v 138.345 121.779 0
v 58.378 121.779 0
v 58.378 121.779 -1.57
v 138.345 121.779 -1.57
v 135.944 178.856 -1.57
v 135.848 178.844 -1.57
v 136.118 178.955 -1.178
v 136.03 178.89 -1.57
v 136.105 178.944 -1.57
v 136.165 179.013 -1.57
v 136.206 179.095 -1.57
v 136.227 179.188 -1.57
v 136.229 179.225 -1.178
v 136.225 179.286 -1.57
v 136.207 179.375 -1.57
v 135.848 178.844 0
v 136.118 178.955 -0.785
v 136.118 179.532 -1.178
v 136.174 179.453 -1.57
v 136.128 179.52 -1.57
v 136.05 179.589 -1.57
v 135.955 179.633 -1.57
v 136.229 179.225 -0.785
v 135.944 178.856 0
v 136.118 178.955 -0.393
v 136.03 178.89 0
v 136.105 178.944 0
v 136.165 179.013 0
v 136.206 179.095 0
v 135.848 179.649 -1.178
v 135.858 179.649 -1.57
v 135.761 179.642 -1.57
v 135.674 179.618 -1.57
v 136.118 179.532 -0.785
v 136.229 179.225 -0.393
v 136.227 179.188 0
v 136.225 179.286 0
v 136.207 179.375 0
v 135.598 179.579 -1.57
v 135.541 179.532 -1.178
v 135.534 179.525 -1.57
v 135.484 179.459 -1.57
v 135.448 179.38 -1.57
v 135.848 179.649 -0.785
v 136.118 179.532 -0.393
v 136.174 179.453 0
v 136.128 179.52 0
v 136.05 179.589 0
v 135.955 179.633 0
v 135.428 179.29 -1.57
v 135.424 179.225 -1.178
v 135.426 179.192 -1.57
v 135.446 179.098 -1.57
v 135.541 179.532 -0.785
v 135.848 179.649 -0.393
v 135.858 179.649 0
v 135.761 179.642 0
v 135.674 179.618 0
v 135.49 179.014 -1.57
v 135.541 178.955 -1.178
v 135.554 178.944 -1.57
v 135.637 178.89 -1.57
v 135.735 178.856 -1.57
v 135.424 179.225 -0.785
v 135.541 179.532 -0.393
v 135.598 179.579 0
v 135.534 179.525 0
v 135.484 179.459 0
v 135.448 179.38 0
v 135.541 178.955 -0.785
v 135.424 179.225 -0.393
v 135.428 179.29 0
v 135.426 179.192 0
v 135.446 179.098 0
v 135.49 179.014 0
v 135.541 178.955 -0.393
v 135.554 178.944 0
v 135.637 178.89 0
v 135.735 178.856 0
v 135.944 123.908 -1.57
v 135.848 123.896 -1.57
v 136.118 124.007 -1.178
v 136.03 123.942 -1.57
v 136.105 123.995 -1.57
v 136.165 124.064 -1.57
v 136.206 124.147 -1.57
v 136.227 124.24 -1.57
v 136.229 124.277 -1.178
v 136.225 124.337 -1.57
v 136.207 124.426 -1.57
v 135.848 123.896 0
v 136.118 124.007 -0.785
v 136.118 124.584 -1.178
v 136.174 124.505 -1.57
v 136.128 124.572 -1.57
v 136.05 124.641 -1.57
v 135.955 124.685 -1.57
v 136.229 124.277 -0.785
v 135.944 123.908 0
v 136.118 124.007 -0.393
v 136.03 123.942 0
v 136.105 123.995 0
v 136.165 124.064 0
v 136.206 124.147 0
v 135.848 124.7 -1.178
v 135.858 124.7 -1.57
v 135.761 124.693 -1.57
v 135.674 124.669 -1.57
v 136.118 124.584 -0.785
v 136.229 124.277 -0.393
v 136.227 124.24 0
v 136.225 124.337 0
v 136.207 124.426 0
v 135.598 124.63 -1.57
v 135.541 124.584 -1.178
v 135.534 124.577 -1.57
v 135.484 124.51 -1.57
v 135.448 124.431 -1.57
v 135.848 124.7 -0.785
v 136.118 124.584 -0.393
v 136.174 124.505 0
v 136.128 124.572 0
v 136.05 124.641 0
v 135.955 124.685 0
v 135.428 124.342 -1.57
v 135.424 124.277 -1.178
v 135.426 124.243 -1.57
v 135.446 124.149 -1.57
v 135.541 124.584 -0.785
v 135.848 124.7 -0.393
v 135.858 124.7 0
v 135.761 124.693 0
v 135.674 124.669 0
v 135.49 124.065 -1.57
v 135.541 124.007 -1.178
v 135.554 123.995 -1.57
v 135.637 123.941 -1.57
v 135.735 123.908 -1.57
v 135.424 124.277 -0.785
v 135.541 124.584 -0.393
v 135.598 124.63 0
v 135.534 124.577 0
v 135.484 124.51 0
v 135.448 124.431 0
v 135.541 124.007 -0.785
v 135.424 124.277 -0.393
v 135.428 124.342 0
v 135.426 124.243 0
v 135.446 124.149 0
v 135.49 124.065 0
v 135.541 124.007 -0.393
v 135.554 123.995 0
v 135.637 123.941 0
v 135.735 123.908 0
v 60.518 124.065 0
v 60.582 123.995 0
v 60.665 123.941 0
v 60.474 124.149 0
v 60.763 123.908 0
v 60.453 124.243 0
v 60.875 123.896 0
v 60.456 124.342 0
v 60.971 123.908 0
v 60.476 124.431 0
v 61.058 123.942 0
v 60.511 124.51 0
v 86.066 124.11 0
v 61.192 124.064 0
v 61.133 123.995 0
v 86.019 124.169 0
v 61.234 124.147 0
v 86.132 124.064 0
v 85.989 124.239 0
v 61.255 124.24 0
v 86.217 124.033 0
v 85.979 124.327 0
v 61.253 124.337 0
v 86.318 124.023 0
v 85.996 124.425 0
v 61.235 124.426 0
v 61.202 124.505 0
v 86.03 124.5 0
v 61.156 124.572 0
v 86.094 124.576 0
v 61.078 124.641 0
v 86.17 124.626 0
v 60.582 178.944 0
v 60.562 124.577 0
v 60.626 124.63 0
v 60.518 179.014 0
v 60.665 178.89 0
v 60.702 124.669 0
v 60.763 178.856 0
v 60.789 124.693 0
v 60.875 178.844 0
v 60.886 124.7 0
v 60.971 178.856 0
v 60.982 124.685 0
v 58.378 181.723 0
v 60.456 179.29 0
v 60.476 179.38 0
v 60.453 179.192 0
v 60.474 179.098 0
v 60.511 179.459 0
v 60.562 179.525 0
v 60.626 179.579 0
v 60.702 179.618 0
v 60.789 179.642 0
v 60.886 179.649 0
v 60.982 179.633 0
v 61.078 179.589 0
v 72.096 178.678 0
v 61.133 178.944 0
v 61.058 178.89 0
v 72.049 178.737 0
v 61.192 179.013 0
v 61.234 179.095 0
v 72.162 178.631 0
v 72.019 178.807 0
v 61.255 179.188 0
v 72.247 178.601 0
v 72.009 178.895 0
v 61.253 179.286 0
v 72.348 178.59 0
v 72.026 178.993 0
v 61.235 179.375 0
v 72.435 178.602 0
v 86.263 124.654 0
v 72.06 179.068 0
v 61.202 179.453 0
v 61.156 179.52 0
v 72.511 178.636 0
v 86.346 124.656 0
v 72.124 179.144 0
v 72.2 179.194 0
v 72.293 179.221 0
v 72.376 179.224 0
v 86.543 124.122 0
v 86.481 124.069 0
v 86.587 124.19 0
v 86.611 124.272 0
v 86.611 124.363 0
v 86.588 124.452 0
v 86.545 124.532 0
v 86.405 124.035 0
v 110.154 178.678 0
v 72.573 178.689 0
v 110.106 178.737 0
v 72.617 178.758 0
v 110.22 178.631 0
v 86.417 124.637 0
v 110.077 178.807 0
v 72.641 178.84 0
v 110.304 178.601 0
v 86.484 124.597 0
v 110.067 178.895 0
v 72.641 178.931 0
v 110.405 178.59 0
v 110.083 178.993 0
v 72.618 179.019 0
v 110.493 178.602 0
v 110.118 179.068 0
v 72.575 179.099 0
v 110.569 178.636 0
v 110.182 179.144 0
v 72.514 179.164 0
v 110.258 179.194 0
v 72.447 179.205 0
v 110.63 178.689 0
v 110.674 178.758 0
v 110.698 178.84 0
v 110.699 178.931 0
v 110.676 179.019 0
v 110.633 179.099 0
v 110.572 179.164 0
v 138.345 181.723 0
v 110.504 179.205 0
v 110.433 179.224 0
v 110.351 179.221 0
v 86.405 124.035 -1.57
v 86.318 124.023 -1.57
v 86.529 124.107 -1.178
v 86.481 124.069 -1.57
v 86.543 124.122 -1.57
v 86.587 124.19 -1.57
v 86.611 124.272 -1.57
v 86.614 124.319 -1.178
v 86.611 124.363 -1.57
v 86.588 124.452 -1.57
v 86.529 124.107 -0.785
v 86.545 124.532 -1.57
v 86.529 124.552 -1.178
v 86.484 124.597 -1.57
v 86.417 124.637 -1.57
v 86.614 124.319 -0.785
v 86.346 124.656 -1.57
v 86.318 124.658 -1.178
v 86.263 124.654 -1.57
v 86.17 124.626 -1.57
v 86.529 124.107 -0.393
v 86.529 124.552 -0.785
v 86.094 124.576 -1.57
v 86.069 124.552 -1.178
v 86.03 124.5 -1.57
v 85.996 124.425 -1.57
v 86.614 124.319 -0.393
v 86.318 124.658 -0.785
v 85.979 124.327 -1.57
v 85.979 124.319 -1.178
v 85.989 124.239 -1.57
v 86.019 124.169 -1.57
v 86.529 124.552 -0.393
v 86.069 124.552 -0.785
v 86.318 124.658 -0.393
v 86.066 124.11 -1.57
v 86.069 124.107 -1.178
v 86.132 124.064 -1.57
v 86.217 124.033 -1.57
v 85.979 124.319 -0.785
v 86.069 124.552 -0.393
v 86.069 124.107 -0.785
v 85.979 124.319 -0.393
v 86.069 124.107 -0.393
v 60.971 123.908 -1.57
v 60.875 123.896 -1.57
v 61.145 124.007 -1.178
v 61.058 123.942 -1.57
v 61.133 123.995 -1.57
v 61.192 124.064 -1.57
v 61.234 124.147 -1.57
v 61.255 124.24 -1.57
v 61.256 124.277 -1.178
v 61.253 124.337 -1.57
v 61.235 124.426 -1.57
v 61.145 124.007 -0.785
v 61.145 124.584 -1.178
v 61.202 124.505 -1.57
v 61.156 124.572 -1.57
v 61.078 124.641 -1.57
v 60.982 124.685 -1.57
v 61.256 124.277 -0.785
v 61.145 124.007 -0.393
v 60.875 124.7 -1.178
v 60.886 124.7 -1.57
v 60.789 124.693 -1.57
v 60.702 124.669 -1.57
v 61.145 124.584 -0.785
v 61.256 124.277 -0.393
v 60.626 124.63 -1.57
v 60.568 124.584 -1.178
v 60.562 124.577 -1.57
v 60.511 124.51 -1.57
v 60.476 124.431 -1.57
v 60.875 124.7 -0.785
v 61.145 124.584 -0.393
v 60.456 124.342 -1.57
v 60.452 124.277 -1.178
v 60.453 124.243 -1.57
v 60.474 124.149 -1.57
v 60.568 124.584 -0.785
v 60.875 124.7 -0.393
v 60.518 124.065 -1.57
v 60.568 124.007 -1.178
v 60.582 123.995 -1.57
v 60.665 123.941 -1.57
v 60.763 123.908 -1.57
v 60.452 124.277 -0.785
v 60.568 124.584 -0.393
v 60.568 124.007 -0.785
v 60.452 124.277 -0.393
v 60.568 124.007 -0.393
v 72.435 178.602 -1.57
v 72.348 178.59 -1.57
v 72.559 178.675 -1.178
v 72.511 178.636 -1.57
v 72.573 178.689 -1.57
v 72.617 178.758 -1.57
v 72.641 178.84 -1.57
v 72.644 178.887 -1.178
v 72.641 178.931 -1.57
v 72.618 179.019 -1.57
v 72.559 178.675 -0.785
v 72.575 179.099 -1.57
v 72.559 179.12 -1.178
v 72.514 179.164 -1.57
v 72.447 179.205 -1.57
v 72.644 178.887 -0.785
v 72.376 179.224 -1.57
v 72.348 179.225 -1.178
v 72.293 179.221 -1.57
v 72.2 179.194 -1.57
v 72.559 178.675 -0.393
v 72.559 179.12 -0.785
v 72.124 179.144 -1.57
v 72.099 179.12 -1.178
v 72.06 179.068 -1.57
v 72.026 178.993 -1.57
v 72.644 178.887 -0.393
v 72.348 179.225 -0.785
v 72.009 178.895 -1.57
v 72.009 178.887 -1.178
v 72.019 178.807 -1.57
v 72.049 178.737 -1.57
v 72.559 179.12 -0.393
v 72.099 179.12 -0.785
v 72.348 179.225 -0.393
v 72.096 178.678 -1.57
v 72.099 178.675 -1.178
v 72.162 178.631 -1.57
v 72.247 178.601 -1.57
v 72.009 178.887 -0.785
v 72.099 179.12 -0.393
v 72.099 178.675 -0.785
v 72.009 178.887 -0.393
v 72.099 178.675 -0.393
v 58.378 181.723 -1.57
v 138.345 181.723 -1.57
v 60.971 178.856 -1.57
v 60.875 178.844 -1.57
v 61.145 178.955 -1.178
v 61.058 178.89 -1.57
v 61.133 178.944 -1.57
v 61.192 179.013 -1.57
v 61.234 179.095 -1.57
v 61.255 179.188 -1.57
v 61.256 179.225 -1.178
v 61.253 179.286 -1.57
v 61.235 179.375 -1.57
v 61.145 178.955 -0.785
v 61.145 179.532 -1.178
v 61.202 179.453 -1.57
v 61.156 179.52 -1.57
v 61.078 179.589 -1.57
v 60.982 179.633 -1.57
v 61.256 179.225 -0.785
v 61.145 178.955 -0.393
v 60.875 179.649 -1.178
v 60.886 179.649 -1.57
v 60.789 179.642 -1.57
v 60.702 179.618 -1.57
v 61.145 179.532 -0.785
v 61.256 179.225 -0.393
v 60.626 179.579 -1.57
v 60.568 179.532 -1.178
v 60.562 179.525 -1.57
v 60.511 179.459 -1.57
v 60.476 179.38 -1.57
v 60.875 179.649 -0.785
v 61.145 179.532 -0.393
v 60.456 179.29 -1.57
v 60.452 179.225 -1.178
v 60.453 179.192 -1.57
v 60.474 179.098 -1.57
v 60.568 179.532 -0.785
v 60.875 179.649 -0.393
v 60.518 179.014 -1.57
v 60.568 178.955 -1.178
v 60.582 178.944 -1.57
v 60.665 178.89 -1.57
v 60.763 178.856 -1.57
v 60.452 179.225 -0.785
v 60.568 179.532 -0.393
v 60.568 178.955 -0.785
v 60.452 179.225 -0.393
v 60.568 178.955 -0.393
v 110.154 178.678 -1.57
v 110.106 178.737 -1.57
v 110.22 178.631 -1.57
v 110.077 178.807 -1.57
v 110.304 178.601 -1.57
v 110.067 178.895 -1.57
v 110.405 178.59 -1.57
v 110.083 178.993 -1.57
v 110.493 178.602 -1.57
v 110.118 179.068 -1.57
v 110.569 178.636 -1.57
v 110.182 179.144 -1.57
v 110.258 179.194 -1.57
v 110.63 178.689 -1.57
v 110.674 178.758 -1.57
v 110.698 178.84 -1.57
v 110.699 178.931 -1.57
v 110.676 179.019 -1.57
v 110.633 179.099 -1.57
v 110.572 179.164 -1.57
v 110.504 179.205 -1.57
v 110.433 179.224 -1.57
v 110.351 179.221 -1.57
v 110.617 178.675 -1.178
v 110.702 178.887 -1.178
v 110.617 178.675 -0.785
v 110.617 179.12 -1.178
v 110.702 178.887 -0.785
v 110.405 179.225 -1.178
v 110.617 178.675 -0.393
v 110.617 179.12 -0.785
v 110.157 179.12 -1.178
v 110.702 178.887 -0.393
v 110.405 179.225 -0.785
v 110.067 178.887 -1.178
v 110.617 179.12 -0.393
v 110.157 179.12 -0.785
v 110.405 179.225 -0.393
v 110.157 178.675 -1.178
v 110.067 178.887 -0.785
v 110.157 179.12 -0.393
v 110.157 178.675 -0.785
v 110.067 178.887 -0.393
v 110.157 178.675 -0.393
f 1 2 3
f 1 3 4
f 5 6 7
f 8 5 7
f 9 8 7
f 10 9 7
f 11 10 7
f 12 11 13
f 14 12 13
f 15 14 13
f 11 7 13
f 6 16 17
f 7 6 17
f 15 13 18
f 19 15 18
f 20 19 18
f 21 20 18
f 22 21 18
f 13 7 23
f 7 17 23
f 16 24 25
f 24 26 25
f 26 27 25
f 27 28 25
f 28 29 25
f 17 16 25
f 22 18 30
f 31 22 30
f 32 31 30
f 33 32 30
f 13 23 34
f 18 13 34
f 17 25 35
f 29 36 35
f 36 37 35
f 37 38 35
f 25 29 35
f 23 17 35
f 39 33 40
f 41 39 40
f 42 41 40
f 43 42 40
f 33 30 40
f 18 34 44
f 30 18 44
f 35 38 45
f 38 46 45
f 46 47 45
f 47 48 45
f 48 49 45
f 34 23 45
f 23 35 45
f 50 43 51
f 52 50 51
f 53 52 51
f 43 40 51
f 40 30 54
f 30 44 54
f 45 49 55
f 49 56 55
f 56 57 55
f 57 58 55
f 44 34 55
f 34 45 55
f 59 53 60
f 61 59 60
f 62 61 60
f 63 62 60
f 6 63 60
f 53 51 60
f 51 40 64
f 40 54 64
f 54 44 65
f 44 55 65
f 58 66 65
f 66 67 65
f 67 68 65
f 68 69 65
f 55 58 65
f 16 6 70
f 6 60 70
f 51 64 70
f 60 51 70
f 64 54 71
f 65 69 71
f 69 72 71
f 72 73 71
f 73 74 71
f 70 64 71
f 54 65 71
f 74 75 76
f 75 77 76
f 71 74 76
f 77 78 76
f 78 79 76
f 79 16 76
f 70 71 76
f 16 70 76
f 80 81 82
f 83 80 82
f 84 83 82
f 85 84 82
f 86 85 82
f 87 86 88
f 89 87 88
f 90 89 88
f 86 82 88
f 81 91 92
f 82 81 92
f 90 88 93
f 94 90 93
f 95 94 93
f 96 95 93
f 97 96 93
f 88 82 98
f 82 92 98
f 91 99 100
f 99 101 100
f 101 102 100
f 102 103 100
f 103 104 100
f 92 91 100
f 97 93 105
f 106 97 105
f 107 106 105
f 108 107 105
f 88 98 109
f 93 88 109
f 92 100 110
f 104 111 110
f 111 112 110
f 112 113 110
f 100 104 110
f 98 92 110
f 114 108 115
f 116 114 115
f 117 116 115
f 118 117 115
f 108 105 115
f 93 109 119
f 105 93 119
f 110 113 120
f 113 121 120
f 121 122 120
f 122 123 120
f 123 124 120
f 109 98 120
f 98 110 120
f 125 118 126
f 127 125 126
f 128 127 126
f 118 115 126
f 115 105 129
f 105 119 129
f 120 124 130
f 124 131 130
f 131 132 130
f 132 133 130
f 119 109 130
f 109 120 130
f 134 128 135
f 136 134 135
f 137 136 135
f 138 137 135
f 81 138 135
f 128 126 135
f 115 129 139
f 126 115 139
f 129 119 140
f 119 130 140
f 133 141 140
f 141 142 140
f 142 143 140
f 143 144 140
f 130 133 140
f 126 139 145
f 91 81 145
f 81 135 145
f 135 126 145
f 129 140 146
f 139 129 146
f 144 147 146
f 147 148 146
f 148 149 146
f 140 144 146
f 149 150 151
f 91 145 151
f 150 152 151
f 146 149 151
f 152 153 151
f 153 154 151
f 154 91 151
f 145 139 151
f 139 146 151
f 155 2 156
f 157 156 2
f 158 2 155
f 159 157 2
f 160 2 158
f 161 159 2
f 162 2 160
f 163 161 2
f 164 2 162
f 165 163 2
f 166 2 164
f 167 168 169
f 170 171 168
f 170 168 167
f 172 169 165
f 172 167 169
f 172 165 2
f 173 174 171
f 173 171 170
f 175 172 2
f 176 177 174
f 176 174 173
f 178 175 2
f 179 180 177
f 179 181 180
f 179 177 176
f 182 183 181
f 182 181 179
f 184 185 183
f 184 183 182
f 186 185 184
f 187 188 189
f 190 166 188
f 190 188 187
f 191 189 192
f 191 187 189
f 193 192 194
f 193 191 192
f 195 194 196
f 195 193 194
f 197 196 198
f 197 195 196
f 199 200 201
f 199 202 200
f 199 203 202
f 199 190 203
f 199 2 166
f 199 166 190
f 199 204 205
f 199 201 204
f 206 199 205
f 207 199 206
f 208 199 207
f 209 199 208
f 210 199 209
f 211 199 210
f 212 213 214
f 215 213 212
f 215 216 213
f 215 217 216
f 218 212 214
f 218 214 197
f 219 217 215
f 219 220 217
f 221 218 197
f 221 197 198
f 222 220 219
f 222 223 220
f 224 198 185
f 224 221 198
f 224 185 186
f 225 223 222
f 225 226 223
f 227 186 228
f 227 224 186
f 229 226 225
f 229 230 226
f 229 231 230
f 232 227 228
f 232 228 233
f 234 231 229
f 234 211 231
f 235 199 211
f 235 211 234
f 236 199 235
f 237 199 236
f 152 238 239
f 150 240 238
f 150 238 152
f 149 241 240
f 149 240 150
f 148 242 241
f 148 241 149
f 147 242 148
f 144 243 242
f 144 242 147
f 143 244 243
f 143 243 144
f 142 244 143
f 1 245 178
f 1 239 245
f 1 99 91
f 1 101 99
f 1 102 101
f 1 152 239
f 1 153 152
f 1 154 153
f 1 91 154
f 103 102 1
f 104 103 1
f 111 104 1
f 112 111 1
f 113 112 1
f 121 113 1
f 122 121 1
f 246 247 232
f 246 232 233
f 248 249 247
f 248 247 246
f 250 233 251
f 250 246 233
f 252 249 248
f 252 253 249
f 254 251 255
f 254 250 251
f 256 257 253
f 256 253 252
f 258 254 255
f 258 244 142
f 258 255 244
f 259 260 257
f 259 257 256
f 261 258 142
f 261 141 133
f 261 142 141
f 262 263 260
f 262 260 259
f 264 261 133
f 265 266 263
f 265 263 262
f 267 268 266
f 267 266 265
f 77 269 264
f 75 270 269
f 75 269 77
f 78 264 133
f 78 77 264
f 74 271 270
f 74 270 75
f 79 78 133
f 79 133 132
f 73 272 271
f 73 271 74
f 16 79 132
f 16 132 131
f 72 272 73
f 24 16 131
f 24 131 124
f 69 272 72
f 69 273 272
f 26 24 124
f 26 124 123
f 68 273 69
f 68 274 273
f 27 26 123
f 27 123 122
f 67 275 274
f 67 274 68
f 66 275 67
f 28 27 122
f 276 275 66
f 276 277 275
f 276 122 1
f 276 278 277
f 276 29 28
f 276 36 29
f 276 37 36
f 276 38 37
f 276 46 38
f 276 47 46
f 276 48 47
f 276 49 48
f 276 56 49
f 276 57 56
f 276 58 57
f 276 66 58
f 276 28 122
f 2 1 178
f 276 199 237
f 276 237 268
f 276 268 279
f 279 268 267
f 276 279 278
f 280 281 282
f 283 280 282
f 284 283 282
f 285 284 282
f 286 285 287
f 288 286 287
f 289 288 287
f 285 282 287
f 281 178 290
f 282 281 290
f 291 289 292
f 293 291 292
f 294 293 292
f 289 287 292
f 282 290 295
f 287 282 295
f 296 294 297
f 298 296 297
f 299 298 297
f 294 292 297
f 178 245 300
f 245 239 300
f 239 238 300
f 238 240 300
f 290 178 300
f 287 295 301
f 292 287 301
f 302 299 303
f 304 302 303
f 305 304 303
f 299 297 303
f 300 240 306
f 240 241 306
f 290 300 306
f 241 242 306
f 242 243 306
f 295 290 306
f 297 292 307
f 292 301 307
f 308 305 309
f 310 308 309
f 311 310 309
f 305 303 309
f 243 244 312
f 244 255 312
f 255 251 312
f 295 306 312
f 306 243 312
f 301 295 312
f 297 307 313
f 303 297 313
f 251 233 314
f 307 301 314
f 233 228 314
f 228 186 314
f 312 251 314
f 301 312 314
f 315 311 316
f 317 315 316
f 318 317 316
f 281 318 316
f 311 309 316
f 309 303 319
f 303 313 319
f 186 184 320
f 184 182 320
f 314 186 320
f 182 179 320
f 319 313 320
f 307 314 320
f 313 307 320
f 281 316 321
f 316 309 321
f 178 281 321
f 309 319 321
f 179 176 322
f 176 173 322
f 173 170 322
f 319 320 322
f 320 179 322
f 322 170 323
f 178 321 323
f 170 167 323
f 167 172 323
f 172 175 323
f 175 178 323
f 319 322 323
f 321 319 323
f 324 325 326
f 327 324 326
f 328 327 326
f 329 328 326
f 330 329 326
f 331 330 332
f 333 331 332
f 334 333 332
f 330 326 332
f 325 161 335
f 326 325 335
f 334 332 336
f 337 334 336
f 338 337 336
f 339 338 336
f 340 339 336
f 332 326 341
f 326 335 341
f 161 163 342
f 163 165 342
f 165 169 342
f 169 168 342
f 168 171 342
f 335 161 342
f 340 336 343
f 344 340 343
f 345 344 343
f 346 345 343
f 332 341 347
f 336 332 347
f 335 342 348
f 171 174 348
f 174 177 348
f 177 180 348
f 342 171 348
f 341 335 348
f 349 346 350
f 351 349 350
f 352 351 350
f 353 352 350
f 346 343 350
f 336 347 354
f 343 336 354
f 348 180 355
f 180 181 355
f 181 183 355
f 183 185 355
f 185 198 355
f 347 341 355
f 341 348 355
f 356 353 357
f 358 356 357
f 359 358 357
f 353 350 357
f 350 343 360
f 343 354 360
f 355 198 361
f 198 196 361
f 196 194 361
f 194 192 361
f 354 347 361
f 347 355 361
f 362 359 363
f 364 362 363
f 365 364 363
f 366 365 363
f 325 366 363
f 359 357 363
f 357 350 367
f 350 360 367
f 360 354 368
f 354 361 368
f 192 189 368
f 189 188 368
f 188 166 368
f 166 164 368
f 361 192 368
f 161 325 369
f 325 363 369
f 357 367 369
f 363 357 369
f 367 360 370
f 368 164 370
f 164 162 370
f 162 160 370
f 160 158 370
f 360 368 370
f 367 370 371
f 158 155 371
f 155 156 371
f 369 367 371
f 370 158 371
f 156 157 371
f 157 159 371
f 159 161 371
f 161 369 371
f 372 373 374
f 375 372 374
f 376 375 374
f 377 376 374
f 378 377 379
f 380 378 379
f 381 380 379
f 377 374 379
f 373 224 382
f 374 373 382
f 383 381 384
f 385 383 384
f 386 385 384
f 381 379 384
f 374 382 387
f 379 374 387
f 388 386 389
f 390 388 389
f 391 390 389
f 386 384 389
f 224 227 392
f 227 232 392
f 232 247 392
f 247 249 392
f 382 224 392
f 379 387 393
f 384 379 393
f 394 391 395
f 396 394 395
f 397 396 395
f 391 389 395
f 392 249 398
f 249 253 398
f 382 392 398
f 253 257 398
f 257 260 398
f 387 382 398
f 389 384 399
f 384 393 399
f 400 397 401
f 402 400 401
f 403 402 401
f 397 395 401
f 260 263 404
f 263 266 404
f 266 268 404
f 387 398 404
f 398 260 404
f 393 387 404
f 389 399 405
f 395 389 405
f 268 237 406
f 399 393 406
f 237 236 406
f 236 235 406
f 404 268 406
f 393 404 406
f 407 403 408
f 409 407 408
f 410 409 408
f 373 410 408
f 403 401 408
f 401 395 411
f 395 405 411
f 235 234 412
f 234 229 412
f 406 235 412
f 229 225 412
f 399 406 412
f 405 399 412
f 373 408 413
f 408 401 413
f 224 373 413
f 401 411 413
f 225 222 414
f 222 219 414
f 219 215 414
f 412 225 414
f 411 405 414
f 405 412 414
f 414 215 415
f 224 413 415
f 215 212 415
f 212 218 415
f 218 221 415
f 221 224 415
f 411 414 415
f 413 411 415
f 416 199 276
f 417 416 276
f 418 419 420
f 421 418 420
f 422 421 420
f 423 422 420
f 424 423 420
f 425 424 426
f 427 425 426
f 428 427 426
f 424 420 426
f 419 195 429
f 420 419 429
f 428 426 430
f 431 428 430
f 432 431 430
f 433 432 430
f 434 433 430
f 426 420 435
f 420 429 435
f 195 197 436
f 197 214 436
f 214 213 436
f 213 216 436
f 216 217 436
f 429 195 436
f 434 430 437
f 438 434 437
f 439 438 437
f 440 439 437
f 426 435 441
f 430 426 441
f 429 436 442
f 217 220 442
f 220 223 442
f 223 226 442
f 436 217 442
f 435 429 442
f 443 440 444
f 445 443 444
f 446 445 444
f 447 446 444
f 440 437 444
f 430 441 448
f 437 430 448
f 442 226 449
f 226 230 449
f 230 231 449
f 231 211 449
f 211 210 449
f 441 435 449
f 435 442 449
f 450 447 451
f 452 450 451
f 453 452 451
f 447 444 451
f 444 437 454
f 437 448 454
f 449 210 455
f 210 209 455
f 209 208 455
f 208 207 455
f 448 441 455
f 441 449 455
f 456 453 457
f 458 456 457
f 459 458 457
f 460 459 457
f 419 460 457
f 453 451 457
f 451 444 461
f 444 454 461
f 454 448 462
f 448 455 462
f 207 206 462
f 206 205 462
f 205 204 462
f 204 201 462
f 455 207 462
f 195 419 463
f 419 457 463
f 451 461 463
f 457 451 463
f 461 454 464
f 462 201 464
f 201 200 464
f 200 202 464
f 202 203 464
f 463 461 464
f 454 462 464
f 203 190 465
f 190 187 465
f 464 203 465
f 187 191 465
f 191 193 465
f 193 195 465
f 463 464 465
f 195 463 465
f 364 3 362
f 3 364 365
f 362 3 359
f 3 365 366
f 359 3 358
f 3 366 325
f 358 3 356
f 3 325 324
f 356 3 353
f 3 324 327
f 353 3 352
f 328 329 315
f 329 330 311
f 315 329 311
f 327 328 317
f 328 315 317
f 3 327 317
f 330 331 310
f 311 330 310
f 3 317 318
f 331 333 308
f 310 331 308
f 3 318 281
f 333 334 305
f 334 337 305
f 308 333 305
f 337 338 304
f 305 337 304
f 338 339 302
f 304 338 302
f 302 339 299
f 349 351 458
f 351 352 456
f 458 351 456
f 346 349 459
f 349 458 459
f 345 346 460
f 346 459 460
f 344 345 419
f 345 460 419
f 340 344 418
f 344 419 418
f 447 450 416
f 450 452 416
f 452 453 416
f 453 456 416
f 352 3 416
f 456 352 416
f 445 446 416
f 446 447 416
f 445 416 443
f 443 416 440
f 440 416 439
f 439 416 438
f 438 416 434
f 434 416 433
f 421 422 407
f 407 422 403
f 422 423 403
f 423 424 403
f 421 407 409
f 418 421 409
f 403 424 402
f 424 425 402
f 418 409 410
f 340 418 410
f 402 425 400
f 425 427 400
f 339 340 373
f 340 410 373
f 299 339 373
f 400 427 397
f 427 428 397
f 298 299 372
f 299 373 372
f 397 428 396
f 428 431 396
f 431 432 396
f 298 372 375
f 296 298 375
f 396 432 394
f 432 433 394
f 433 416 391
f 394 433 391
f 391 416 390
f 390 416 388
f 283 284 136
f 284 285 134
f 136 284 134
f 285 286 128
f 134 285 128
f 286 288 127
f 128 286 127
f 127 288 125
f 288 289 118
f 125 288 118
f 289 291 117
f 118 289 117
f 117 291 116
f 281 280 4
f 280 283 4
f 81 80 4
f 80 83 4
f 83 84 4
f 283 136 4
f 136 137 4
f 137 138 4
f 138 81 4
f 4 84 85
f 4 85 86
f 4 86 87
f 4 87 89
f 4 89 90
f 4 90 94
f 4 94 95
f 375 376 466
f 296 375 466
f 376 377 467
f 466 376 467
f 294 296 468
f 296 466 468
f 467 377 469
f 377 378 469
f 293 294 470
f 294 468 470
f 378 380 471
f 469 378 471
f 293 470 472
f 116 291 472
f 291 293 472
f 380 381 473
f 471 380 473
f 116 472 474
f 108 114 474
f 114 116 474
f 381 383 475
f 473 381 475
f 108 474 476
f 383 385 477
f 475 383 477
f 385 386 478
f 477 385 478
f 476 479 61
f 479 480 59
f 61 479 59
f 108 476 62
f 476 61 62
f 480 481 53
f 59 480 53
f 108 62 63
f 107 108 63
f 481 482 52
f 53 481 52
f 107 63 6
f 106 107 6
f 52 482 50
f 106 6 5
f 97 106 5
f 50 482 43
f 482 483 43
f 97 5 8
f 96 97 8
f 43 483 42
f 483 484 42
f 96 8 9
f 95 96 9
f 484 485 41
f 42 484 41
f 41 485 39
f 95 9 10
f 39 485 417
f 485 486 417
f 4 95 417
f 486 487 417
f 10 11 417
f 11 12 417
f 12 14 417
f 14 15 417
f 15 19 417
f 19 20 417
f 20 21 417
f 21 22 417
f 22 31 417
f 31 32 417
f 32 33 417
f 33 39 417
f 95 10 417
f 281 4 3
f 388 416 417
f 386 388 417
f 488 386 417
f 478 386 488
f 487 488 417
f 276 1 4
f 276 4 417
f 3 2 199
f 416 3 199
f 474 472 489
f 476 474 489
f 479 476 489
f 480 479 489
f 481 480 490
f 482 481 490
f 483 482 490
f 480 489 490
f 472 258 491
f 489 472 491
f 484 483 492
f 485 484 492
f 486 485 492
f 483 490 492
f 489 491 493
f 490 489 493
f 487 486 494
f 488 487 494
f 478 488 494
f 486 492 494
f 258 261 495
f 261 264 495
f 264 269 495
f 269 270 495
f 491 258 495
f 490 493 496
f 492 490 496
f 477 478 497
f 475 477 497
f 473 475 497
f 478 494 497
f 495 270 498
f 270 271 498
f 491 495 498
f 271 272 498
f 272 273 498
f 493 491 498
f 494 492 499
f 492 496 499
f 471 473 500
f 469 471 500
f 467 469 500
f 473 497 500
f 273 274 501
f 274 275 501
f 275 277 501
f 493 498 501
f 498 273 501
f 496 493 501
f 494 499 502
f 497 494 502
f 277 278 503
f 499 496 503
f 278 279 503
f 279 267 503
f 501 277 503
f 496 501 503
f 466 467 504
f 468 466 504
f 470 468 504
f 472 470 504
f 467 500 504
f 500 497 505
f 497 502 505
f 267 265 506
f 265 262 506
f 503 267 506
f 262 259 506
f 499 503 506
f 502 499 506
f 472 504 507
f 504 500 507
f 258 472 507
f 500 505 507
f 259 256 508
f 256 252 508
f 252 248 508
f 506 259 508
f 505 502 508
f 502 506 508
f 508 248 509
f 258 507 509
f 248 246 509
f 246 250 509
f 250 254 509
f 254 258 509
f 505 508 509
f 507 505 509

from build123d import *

# Parameters (mm, degrees)
MODEL_W             = 79.967666
MODEL_H             = 59.944
BOSS_EXTRUDE2_DEPTH = 1.57


with BuildPart() as part:
    # Model → Boss-Extrude2 (new body)
    with BuildSketch(Plane.XY):
        with Locations((98.3615, 151.75103)):
            Rectangle(MODEL_W, MODEL_H)
        with BuildLine():
            add(Edge.make_bspline(
                [(86.614, 124.31903), (86.614, 124.488363), (86.487, 124.657697), (86.317667, 124.657697)],
                knots=[0, 0, 0, 0, 1, 1, 1, 1], degree=3))
            add(Edge.make_bspline(
                [(86.317667, 124.657697), (86.106, 124.657697), (85.979, 124.488363), (85.979, 124.31903)],
                knots=[0, 0, 0, 0, 1, 1, 1, 1], degree=3))
            add(Edge.make_bspline(
                [(85.979, 124.31903), (85.979, 124.149697), (86.106, 124.022697), (86.317667, 124.022697)],
                knots=[0, 0, 0, 0, 1, 1, 1, 1], degree=3))
            add(Edge.make_bspline(
                [(86.317667, 124.022697), (86.487, 124.022697), (86.614, 124.149697), (86.614, 124.31903)],
                knots=[0, 0, 0, 0, 1, 1, 1, 1], degree=3))
        make_face(mode=Mode.SUBTRACT)
        with BuildLine():
            add(Edge.make_bspline(
                [(61.256333, 124.276697), (61.256333, 124.530697), (61.087, 124.70003), (60.875333, 124.70003)],
                knots=[0, 0, 0, 0, 1, 1, 1, 1], degree=3))
            add(Edge.make_bspline(
                [(60.875333, 124.70003), (60.621333, 124.70003), (60.452, 124.530697), (60.452, 124.276697)],
                knots=[0, 0, 0, 0, 1, 1, 1, 1], degree=3))
            add(Edge.make_bspline(
                [(60.452, 124.276697), (60.452, 124.06503), (60.621333, 123.895697), (60.875333, 123.895697)],
                knots=[0, 0, 0, 0, 1, 1, 1, 1], degree=3))
            add(Edge.make_bspline(
                [(60.875333, 123.895697), (61.087, 123.895697), (61.256333, 124.06503), (61.256333, 124.276697)],
                knots=[0, 0, 0, 0, 1, 1, 1, 1], degree=3))
        make_face(mode=Mode.SUBTRACT)
        with BuildLine():
            add(Edge.make_bspline(
                [(136.228667, 124.276697), (136.228667, 124.530697), (136.059333, 124.70003), (135.847667, 124.70003)],
                knots=[0, 0, 0, 0, 1, 1, 1, 1], degree=3))
            add(Edge.make_bspline(
                [(135.847667, 124.70003), (135.593667, 124.70003), (135.424333, 124.530697), (135.424333, 124.276697)],
                knots=[0, 0, 0, 0, 1, 1, 1, 1], degree=3))
            add(Edge.make_bspline(
                [(135.424333, 124.276697), (135.424333, 124.06503), (135.593667, 123.895697), (135.847667, 123.895697)],
                knots=[0, 0, 0, 0, 1, 1, 1, 1], degree=3))
            add(Edge.make_bspline(
                [(135.847667, 123.895697), (136.059333, 123.895697), (136.228667, 124.06503), (136.228667, 124.276697)],
                knots=[0, 0, 0, 0, 1, 1, 1, 1], degree=3))
        make_face(mode=Mode.SUBTRACT)
        with BuildLine():
            add(Edge.make_bspline(
                [(136.228667, 179.225363), (136.228667, 179.479363), (136.059333, 179.648697), (135.847667, 179.648697)],
                knots=[0, 0, 0, 0, 1, 1, 1, 1], degree=3))
            add(Edge.make_bspline(
                [(135.847667, 179.648697), (135.593667, 179.648697), (135.424333, 179.479363), (135.424333, 179.225363)],
                knots=[0, 0, 0, 0, 1, 1, 1, 1], degree=3))
            add(Edge.make_bspline(
                [(135.424333, 179.225363), (135.424333, 179.013697), (135.593667, 178.844363), (135.847667, 178.844363)],
                knots=[0, 0, 0, 0, 1, 1, 1, 1], degree=3))
            add(Edge.make_bspline(
                [(135.847667, 178.844363), (136.059333, 178.844363), (136.228667, 179.013697), (136.228667, 179.225363)],
                knots=[0, 0, 0, 0, 1, 1, 1, 1], degree=3))
        make_face(mode=Mode.SUBTRACT)
        with BuildLine():
            add(Edge.make_bspline(
                [(72.644, 178.886697), (72.644, 179.05603), (72.517, 179.225363), (72.347667, 179.225363)],
                knots=[0, 0, 0, 0, 1, 1, 1, 1], degree=3))
            add(Edge.make_bspline(
                [(72.347667, 179.225363), (72.136, 179.225363), (72.009, 179.05603), (72.009, 178.886697)],
                knots=[0, 0, 0, 0, 1, 1, 1, 1], degree=3))
            add(Edge.make_bspline(
                [(72.009, 178.886697), (72.009, 178.717363), (72.136, 178.590363), (72.347667, 178.590363)],
                knots=[0, 0, 0, 0, 1, 1, 1, 1], degree=3))
            add(Edge.make_bspline(
                [(72.347667, 178.590363), (72.517, 178.590363), (72.644, 178.717363), (72.644, 178.886697)],
                knots=[0, 0, 0, 0, 1, 1, 1, 1], degree=3))
        make_face(mode=Mode.SUBTRACT)
        with BuildLine():
            add(Edge.make_bspline(
                [(110.701667, 178.886697), (110.701667, 179.05603), (110.574667, 179.225363), (110.405333, 179.225363)],
                knots=[0, 0, 0, 0, 1, 1, 1, 1], degree=3))
            add(Edge.make_bspline(
                [(110.405333, 179.225363), (110.193667, 179.225363), (110.066667, 179.05603), (110.066667, 178.886697)],
                knots=[0, 0, 0, 0, 1, 1, 1, 1], degree=3))
            add(Edge.make_bspline(
                [(110.066667, 178.886697), (110.066667, 178.717363), (110.193667, 178.590363), (110.405333, 178.590363)],
                knots=[0, 0, 0, 0, 1, 1, 1, 1], degree=3))
            add(Edge.make_bspline(
                [(110.405333, 178.590363), (110.574667, 178.590363), (110.701667, 178.717363), (110.701667, 178.886697)],
                knots=[0, 0, 0, 0, 1, 1, 1, 1], degree=3))
        make_face(mode=Mode.SUBTRACT)
        with BuildLine():
            add(Edge.make_bspline(
                [(61.256333, 179.225363), (61.256333, 179.479363), (61.087, 179.648697), (60.875333, 179.648697)],
                knots=[0, 0, 0, 0, 1, 1, 1, 1], degree=3))
            add(Edge.make_bspline(
                [(60.875333, 179.648697), (60.621333, 179.648697), (60.452, 179.479363), (60.452, 179.225363)],
                knots=[0, 0, 0, 0, 1, 1, 1, 1], degree=3))
            add(Edge.make_bspline(
                [(60.452, 179.225363), (60.452, 179.013697), (60.621333, 178.844363), (60.875333, 178.844363)],
                knots=[0, 0, 0, 0, 1, 1, 1, 1], degree=3))
            add(Edge.make_bspline(
                [(60.875333, 178.844363), (61.087, 178.844363), (61.256333, 179.013697), (61.256333, 179.225363)],
                knots=[0, 0, 0, 0, 1, 1, 1, 1], degree=3))
        make_face(mode=Mode.SUBTRACT)
    extrude(amount=-BOSS_EXTRUDE2_DEPTH)


solid = part.part
